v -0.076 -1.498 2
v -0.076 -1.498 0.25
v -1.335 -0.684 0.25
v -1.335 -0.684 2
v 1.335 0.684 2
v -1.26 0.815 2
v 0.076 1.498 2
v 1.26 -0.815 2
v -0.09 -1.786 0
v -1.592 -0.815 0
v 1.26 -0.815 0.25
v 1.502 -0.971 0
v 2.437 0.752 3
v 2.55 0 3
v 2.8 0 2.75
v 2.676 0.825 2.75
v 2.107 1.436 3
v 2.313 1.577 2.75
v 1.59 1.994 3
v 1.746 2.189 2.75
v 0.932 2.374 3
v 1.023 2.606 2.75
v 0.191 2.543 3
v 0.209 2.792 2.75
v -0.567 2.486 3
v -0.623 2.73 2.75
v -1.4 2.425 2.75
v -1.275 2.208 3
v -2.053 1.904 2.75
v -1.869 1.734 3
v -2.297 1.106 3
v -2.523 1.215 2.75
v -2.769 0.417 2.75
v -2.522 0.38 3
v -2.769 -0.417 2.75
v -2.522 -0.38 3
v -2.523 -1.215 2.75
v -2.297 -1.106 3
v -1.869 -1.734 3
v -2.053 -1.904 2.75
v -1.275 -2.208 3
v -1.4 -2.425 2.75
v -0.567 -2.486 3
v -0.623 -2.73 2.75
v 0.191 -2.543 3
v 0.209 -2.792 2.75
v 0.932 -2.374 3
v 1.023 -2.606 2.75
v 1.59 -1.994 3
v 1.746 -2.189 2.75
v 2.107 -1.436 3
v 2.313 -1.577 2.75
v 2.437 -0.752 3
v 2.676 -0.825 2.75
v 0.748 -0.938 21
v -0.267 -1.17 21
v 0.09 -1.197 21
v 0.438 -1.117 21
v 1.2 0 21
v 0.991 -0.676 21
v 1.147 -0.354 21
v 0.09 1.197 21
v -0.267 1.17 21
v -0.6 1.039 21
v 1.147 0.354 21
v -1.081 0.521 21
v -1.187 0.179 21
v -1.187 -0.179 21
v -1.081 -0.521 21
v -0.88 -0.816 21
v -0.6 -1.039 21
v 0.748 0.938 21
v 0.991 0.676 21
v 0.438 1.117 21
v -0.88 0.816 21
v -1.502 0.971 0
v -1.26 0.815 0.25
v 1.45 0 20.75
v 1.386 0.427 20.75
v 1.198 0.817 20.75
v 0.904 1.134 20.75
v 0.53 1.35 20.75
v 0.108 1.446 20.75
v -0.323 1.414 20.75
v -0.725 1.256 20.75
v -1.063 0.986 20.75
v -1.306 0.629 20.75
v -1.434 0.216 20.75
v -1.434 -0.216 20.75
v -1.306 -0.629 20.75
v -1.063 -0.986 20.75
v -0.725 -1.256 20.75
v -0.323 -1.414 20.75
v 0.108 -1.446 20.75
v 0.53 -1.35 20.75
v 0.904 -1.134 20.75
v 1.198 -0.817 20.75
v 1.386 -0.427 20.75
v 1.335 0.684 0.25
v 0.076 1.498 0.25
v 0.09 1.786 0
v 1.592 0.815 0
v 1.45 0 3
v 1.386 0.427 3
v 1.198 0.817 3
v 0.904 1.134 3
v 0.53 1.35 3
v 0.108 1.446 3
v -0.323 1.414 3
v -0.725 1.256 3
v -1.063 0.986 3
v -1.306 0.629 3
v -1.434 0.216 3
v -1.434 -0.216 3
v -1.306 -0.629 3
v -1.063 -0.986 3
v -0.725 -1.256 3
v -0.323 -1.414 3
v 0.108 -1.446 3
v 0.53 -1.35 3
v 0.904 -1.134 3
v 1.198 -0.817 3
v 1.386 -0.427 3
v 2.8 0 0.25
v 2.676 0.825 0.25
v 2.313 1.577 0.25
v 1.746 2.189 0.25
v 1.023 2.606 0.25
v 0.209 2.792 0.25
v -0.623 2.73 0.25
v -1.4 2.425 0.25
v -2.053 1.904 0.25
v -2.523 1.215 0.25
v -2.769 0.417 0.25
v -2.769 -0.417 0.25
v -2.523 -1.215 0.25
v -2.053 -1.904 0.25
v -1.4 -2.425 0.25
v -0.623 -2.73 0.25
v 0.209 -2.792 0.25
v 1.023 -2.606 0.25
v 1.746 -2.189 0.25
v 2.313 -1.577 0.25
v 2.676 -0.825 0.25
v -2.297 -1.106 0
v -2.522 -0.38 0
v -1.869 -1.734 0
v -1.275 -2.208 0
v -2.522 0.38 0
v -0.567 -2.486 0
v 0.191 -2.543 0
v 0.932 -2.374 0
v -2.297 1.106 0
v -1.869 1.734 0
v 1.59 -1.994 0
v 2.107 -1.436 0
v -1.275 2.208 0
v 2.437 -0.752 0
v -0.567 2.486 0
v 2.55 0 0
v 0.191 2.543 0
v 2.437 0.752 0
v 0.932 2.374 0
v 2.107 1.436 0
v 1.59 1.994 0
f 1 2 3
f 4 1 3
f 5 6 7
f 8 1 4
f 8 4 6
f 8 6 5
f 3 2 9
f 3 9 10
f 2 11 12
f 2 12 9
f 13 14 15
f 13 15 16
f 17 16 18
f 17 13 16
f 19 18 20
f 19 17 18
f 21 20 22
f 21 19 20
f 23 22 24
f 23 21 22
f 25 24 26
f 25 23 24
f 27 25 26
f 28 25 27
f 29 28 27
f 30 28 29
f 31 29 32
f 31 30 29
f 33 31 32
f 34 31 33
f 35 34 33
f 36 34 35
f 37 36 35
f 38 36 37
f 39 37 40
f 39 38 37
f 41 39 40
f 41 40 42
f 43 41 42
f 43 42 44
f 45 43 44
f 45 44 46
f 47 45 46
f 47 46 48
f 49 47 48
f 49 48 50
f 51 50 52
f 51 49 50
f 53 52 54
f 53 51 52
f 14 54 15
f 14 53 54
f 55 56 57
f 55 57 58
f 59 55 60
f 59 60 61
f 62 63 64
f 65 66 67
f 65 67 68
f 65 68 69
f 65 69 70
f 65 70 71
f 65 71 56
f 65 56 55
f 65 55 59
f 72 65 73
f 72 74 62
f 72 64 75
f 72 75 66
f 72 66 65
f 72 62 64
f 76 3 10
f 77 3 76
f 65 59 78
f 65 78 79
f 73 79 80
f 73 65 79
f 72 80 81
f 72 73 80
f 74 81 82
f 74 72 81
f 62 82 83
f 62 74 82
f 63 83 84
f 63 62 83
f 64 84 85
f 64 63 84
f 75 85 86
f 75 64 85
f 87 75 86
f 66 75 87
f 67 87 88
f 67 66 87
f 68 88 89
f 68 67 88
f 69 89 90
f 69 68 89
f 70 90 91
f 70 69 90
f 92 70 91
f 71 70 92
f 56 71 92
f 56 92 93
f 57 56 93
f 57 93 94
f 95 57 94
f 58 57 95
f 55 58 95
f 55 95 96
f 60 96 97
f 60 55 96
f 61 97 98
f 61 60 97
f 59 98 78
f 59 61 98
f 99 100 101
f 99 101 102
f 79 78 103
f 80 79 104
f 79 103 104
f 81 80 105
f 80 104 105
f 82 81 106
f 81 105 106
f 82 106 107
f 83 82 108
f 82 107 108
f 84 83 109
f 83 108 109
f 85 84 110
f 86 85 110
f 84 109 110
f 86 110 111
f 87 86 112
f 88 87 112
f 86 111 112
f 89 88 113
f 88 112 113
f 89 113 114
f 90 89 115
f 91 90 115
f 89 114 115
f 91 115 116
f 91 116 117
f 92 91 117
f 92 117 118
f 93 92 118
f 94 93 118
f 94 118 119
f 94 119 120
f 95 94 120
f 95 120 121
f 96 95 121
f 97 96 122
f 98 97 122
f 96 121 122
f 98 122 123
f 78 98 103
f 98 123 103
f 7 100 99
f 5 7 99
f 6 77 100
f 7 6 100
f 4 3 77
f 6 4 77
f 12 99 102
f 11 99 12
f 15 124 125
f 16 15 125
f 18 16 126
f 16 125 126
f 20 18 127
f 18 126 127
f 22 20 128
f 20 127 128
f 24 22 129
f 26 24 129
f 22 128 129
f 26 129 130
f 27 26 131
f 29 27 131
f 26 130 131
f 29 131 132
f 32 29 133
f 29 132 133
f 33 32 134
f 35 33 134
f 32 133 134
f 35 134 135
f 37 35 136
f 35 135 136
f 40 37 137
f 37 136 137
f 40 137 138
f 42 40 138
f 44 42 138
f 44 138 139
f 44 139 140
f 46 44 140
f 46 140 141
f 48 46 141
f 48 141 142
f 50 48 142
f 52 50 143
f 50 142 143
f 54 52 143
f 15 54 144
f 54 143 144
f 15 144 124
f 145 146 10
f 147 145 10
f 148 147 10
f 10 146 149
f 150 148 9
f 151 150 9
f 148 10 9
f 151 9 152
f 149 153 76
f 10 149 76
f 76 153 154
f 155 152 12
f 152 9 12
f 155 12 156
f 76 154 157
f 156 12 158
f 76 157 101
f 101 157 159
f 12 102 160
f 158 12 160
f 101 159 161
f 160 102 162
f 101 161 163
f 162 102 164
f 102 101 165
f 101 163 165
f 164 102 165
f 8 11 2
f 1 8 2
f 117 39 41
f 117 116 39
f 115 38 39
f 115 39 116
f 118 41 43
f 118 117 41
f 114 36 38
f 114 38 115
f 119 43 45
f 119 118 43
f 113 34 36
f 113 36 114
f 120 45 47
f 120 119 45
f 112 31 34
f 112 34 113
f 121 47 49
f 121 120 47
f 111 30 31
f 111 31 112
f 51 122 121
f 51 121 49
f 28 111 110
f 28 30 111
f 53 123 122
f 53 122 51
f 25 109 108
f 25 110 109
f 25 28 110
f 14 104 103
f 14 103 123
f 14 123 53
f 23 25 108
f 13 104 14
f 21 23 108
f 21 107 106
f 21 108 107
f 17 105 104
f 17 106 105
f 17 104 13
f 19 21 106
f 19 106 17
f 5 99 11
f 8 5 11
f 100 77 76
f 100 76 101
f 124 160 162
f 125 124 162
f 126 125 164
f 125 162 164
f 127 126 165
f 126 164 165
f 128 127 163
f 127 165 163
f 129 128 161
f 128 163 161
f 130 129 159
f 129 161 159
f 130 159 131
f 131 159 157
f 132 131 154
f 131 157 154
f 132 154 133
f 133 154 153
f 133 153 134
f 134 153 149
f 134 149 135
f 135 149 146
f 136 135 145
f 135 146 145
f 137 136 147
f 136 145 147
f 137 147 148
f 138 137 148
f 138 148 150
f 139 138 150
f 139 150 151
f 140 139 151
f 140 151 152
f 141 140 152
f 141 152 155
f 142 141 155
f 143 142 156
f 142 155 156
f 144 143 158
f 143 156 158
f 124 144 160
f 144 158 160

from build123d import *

# Parameters (mm, degrees)
SKETCH_R     = 2.8
PAD_DEPTH    = 3
SKETCH001_R  = 1.45
PAD001_DEPTH = 18
POCKET_DEPTH = 2
CHAMFER_SIZE = 0.25


with BuildPart() as part:
    # Sketch → Pad (new body)
    with BuildSketch(Plane.XY):
        Circle(SKETCH_R)
    extrude(amount=PAD_DEPTH)

    # Sketch001 (on Face3 of Pad) → Pad001 (join)
    with BuildSketch(Plane.XY.offset(3)):
        Circle(SKETCH001_R)
    extrude(amount=PAD001_DEPTH)

    # Sketch002 (on Face2 of Pad001) → Pocket (cut)
    with BuildSketch(Plane(origin=(0, 0, 0), x_dir=(1, 0, 0), z_dir=(0, 0, -1))):
        Polygon((1.259542, 0.814588), (-0.075682, 1.49809), (-1.335225, 0.683502), (-1.259542, -0.814588), (0.075682, -1.49809), (1.335225, -0.683502), align=None)
    extrude(amount=-POCKET_DEPTH, mode=Mode.SUBTRACT)

    # Chamfer
    chamfer_edges = [part.edges().sort_by_distance(p)[0] for p in [
        (-2.8, 0, 3),
        (-2.8, 0, 0),
        (1.297384, -0.065543, 0),
        (0.705454, 1.090796, 0),
        (-0.59193, 1.156339, 0),
        (-1.297384, 0.065543, 0),
        (-0.705454, -1.090796, 0),
        (0.59193, -1.156339, 0),
        (-1.45, 0, 21),
    ]]
    chamfer(chamfer_edges, length=CHAMFER_SIZE)


solid = part.part
